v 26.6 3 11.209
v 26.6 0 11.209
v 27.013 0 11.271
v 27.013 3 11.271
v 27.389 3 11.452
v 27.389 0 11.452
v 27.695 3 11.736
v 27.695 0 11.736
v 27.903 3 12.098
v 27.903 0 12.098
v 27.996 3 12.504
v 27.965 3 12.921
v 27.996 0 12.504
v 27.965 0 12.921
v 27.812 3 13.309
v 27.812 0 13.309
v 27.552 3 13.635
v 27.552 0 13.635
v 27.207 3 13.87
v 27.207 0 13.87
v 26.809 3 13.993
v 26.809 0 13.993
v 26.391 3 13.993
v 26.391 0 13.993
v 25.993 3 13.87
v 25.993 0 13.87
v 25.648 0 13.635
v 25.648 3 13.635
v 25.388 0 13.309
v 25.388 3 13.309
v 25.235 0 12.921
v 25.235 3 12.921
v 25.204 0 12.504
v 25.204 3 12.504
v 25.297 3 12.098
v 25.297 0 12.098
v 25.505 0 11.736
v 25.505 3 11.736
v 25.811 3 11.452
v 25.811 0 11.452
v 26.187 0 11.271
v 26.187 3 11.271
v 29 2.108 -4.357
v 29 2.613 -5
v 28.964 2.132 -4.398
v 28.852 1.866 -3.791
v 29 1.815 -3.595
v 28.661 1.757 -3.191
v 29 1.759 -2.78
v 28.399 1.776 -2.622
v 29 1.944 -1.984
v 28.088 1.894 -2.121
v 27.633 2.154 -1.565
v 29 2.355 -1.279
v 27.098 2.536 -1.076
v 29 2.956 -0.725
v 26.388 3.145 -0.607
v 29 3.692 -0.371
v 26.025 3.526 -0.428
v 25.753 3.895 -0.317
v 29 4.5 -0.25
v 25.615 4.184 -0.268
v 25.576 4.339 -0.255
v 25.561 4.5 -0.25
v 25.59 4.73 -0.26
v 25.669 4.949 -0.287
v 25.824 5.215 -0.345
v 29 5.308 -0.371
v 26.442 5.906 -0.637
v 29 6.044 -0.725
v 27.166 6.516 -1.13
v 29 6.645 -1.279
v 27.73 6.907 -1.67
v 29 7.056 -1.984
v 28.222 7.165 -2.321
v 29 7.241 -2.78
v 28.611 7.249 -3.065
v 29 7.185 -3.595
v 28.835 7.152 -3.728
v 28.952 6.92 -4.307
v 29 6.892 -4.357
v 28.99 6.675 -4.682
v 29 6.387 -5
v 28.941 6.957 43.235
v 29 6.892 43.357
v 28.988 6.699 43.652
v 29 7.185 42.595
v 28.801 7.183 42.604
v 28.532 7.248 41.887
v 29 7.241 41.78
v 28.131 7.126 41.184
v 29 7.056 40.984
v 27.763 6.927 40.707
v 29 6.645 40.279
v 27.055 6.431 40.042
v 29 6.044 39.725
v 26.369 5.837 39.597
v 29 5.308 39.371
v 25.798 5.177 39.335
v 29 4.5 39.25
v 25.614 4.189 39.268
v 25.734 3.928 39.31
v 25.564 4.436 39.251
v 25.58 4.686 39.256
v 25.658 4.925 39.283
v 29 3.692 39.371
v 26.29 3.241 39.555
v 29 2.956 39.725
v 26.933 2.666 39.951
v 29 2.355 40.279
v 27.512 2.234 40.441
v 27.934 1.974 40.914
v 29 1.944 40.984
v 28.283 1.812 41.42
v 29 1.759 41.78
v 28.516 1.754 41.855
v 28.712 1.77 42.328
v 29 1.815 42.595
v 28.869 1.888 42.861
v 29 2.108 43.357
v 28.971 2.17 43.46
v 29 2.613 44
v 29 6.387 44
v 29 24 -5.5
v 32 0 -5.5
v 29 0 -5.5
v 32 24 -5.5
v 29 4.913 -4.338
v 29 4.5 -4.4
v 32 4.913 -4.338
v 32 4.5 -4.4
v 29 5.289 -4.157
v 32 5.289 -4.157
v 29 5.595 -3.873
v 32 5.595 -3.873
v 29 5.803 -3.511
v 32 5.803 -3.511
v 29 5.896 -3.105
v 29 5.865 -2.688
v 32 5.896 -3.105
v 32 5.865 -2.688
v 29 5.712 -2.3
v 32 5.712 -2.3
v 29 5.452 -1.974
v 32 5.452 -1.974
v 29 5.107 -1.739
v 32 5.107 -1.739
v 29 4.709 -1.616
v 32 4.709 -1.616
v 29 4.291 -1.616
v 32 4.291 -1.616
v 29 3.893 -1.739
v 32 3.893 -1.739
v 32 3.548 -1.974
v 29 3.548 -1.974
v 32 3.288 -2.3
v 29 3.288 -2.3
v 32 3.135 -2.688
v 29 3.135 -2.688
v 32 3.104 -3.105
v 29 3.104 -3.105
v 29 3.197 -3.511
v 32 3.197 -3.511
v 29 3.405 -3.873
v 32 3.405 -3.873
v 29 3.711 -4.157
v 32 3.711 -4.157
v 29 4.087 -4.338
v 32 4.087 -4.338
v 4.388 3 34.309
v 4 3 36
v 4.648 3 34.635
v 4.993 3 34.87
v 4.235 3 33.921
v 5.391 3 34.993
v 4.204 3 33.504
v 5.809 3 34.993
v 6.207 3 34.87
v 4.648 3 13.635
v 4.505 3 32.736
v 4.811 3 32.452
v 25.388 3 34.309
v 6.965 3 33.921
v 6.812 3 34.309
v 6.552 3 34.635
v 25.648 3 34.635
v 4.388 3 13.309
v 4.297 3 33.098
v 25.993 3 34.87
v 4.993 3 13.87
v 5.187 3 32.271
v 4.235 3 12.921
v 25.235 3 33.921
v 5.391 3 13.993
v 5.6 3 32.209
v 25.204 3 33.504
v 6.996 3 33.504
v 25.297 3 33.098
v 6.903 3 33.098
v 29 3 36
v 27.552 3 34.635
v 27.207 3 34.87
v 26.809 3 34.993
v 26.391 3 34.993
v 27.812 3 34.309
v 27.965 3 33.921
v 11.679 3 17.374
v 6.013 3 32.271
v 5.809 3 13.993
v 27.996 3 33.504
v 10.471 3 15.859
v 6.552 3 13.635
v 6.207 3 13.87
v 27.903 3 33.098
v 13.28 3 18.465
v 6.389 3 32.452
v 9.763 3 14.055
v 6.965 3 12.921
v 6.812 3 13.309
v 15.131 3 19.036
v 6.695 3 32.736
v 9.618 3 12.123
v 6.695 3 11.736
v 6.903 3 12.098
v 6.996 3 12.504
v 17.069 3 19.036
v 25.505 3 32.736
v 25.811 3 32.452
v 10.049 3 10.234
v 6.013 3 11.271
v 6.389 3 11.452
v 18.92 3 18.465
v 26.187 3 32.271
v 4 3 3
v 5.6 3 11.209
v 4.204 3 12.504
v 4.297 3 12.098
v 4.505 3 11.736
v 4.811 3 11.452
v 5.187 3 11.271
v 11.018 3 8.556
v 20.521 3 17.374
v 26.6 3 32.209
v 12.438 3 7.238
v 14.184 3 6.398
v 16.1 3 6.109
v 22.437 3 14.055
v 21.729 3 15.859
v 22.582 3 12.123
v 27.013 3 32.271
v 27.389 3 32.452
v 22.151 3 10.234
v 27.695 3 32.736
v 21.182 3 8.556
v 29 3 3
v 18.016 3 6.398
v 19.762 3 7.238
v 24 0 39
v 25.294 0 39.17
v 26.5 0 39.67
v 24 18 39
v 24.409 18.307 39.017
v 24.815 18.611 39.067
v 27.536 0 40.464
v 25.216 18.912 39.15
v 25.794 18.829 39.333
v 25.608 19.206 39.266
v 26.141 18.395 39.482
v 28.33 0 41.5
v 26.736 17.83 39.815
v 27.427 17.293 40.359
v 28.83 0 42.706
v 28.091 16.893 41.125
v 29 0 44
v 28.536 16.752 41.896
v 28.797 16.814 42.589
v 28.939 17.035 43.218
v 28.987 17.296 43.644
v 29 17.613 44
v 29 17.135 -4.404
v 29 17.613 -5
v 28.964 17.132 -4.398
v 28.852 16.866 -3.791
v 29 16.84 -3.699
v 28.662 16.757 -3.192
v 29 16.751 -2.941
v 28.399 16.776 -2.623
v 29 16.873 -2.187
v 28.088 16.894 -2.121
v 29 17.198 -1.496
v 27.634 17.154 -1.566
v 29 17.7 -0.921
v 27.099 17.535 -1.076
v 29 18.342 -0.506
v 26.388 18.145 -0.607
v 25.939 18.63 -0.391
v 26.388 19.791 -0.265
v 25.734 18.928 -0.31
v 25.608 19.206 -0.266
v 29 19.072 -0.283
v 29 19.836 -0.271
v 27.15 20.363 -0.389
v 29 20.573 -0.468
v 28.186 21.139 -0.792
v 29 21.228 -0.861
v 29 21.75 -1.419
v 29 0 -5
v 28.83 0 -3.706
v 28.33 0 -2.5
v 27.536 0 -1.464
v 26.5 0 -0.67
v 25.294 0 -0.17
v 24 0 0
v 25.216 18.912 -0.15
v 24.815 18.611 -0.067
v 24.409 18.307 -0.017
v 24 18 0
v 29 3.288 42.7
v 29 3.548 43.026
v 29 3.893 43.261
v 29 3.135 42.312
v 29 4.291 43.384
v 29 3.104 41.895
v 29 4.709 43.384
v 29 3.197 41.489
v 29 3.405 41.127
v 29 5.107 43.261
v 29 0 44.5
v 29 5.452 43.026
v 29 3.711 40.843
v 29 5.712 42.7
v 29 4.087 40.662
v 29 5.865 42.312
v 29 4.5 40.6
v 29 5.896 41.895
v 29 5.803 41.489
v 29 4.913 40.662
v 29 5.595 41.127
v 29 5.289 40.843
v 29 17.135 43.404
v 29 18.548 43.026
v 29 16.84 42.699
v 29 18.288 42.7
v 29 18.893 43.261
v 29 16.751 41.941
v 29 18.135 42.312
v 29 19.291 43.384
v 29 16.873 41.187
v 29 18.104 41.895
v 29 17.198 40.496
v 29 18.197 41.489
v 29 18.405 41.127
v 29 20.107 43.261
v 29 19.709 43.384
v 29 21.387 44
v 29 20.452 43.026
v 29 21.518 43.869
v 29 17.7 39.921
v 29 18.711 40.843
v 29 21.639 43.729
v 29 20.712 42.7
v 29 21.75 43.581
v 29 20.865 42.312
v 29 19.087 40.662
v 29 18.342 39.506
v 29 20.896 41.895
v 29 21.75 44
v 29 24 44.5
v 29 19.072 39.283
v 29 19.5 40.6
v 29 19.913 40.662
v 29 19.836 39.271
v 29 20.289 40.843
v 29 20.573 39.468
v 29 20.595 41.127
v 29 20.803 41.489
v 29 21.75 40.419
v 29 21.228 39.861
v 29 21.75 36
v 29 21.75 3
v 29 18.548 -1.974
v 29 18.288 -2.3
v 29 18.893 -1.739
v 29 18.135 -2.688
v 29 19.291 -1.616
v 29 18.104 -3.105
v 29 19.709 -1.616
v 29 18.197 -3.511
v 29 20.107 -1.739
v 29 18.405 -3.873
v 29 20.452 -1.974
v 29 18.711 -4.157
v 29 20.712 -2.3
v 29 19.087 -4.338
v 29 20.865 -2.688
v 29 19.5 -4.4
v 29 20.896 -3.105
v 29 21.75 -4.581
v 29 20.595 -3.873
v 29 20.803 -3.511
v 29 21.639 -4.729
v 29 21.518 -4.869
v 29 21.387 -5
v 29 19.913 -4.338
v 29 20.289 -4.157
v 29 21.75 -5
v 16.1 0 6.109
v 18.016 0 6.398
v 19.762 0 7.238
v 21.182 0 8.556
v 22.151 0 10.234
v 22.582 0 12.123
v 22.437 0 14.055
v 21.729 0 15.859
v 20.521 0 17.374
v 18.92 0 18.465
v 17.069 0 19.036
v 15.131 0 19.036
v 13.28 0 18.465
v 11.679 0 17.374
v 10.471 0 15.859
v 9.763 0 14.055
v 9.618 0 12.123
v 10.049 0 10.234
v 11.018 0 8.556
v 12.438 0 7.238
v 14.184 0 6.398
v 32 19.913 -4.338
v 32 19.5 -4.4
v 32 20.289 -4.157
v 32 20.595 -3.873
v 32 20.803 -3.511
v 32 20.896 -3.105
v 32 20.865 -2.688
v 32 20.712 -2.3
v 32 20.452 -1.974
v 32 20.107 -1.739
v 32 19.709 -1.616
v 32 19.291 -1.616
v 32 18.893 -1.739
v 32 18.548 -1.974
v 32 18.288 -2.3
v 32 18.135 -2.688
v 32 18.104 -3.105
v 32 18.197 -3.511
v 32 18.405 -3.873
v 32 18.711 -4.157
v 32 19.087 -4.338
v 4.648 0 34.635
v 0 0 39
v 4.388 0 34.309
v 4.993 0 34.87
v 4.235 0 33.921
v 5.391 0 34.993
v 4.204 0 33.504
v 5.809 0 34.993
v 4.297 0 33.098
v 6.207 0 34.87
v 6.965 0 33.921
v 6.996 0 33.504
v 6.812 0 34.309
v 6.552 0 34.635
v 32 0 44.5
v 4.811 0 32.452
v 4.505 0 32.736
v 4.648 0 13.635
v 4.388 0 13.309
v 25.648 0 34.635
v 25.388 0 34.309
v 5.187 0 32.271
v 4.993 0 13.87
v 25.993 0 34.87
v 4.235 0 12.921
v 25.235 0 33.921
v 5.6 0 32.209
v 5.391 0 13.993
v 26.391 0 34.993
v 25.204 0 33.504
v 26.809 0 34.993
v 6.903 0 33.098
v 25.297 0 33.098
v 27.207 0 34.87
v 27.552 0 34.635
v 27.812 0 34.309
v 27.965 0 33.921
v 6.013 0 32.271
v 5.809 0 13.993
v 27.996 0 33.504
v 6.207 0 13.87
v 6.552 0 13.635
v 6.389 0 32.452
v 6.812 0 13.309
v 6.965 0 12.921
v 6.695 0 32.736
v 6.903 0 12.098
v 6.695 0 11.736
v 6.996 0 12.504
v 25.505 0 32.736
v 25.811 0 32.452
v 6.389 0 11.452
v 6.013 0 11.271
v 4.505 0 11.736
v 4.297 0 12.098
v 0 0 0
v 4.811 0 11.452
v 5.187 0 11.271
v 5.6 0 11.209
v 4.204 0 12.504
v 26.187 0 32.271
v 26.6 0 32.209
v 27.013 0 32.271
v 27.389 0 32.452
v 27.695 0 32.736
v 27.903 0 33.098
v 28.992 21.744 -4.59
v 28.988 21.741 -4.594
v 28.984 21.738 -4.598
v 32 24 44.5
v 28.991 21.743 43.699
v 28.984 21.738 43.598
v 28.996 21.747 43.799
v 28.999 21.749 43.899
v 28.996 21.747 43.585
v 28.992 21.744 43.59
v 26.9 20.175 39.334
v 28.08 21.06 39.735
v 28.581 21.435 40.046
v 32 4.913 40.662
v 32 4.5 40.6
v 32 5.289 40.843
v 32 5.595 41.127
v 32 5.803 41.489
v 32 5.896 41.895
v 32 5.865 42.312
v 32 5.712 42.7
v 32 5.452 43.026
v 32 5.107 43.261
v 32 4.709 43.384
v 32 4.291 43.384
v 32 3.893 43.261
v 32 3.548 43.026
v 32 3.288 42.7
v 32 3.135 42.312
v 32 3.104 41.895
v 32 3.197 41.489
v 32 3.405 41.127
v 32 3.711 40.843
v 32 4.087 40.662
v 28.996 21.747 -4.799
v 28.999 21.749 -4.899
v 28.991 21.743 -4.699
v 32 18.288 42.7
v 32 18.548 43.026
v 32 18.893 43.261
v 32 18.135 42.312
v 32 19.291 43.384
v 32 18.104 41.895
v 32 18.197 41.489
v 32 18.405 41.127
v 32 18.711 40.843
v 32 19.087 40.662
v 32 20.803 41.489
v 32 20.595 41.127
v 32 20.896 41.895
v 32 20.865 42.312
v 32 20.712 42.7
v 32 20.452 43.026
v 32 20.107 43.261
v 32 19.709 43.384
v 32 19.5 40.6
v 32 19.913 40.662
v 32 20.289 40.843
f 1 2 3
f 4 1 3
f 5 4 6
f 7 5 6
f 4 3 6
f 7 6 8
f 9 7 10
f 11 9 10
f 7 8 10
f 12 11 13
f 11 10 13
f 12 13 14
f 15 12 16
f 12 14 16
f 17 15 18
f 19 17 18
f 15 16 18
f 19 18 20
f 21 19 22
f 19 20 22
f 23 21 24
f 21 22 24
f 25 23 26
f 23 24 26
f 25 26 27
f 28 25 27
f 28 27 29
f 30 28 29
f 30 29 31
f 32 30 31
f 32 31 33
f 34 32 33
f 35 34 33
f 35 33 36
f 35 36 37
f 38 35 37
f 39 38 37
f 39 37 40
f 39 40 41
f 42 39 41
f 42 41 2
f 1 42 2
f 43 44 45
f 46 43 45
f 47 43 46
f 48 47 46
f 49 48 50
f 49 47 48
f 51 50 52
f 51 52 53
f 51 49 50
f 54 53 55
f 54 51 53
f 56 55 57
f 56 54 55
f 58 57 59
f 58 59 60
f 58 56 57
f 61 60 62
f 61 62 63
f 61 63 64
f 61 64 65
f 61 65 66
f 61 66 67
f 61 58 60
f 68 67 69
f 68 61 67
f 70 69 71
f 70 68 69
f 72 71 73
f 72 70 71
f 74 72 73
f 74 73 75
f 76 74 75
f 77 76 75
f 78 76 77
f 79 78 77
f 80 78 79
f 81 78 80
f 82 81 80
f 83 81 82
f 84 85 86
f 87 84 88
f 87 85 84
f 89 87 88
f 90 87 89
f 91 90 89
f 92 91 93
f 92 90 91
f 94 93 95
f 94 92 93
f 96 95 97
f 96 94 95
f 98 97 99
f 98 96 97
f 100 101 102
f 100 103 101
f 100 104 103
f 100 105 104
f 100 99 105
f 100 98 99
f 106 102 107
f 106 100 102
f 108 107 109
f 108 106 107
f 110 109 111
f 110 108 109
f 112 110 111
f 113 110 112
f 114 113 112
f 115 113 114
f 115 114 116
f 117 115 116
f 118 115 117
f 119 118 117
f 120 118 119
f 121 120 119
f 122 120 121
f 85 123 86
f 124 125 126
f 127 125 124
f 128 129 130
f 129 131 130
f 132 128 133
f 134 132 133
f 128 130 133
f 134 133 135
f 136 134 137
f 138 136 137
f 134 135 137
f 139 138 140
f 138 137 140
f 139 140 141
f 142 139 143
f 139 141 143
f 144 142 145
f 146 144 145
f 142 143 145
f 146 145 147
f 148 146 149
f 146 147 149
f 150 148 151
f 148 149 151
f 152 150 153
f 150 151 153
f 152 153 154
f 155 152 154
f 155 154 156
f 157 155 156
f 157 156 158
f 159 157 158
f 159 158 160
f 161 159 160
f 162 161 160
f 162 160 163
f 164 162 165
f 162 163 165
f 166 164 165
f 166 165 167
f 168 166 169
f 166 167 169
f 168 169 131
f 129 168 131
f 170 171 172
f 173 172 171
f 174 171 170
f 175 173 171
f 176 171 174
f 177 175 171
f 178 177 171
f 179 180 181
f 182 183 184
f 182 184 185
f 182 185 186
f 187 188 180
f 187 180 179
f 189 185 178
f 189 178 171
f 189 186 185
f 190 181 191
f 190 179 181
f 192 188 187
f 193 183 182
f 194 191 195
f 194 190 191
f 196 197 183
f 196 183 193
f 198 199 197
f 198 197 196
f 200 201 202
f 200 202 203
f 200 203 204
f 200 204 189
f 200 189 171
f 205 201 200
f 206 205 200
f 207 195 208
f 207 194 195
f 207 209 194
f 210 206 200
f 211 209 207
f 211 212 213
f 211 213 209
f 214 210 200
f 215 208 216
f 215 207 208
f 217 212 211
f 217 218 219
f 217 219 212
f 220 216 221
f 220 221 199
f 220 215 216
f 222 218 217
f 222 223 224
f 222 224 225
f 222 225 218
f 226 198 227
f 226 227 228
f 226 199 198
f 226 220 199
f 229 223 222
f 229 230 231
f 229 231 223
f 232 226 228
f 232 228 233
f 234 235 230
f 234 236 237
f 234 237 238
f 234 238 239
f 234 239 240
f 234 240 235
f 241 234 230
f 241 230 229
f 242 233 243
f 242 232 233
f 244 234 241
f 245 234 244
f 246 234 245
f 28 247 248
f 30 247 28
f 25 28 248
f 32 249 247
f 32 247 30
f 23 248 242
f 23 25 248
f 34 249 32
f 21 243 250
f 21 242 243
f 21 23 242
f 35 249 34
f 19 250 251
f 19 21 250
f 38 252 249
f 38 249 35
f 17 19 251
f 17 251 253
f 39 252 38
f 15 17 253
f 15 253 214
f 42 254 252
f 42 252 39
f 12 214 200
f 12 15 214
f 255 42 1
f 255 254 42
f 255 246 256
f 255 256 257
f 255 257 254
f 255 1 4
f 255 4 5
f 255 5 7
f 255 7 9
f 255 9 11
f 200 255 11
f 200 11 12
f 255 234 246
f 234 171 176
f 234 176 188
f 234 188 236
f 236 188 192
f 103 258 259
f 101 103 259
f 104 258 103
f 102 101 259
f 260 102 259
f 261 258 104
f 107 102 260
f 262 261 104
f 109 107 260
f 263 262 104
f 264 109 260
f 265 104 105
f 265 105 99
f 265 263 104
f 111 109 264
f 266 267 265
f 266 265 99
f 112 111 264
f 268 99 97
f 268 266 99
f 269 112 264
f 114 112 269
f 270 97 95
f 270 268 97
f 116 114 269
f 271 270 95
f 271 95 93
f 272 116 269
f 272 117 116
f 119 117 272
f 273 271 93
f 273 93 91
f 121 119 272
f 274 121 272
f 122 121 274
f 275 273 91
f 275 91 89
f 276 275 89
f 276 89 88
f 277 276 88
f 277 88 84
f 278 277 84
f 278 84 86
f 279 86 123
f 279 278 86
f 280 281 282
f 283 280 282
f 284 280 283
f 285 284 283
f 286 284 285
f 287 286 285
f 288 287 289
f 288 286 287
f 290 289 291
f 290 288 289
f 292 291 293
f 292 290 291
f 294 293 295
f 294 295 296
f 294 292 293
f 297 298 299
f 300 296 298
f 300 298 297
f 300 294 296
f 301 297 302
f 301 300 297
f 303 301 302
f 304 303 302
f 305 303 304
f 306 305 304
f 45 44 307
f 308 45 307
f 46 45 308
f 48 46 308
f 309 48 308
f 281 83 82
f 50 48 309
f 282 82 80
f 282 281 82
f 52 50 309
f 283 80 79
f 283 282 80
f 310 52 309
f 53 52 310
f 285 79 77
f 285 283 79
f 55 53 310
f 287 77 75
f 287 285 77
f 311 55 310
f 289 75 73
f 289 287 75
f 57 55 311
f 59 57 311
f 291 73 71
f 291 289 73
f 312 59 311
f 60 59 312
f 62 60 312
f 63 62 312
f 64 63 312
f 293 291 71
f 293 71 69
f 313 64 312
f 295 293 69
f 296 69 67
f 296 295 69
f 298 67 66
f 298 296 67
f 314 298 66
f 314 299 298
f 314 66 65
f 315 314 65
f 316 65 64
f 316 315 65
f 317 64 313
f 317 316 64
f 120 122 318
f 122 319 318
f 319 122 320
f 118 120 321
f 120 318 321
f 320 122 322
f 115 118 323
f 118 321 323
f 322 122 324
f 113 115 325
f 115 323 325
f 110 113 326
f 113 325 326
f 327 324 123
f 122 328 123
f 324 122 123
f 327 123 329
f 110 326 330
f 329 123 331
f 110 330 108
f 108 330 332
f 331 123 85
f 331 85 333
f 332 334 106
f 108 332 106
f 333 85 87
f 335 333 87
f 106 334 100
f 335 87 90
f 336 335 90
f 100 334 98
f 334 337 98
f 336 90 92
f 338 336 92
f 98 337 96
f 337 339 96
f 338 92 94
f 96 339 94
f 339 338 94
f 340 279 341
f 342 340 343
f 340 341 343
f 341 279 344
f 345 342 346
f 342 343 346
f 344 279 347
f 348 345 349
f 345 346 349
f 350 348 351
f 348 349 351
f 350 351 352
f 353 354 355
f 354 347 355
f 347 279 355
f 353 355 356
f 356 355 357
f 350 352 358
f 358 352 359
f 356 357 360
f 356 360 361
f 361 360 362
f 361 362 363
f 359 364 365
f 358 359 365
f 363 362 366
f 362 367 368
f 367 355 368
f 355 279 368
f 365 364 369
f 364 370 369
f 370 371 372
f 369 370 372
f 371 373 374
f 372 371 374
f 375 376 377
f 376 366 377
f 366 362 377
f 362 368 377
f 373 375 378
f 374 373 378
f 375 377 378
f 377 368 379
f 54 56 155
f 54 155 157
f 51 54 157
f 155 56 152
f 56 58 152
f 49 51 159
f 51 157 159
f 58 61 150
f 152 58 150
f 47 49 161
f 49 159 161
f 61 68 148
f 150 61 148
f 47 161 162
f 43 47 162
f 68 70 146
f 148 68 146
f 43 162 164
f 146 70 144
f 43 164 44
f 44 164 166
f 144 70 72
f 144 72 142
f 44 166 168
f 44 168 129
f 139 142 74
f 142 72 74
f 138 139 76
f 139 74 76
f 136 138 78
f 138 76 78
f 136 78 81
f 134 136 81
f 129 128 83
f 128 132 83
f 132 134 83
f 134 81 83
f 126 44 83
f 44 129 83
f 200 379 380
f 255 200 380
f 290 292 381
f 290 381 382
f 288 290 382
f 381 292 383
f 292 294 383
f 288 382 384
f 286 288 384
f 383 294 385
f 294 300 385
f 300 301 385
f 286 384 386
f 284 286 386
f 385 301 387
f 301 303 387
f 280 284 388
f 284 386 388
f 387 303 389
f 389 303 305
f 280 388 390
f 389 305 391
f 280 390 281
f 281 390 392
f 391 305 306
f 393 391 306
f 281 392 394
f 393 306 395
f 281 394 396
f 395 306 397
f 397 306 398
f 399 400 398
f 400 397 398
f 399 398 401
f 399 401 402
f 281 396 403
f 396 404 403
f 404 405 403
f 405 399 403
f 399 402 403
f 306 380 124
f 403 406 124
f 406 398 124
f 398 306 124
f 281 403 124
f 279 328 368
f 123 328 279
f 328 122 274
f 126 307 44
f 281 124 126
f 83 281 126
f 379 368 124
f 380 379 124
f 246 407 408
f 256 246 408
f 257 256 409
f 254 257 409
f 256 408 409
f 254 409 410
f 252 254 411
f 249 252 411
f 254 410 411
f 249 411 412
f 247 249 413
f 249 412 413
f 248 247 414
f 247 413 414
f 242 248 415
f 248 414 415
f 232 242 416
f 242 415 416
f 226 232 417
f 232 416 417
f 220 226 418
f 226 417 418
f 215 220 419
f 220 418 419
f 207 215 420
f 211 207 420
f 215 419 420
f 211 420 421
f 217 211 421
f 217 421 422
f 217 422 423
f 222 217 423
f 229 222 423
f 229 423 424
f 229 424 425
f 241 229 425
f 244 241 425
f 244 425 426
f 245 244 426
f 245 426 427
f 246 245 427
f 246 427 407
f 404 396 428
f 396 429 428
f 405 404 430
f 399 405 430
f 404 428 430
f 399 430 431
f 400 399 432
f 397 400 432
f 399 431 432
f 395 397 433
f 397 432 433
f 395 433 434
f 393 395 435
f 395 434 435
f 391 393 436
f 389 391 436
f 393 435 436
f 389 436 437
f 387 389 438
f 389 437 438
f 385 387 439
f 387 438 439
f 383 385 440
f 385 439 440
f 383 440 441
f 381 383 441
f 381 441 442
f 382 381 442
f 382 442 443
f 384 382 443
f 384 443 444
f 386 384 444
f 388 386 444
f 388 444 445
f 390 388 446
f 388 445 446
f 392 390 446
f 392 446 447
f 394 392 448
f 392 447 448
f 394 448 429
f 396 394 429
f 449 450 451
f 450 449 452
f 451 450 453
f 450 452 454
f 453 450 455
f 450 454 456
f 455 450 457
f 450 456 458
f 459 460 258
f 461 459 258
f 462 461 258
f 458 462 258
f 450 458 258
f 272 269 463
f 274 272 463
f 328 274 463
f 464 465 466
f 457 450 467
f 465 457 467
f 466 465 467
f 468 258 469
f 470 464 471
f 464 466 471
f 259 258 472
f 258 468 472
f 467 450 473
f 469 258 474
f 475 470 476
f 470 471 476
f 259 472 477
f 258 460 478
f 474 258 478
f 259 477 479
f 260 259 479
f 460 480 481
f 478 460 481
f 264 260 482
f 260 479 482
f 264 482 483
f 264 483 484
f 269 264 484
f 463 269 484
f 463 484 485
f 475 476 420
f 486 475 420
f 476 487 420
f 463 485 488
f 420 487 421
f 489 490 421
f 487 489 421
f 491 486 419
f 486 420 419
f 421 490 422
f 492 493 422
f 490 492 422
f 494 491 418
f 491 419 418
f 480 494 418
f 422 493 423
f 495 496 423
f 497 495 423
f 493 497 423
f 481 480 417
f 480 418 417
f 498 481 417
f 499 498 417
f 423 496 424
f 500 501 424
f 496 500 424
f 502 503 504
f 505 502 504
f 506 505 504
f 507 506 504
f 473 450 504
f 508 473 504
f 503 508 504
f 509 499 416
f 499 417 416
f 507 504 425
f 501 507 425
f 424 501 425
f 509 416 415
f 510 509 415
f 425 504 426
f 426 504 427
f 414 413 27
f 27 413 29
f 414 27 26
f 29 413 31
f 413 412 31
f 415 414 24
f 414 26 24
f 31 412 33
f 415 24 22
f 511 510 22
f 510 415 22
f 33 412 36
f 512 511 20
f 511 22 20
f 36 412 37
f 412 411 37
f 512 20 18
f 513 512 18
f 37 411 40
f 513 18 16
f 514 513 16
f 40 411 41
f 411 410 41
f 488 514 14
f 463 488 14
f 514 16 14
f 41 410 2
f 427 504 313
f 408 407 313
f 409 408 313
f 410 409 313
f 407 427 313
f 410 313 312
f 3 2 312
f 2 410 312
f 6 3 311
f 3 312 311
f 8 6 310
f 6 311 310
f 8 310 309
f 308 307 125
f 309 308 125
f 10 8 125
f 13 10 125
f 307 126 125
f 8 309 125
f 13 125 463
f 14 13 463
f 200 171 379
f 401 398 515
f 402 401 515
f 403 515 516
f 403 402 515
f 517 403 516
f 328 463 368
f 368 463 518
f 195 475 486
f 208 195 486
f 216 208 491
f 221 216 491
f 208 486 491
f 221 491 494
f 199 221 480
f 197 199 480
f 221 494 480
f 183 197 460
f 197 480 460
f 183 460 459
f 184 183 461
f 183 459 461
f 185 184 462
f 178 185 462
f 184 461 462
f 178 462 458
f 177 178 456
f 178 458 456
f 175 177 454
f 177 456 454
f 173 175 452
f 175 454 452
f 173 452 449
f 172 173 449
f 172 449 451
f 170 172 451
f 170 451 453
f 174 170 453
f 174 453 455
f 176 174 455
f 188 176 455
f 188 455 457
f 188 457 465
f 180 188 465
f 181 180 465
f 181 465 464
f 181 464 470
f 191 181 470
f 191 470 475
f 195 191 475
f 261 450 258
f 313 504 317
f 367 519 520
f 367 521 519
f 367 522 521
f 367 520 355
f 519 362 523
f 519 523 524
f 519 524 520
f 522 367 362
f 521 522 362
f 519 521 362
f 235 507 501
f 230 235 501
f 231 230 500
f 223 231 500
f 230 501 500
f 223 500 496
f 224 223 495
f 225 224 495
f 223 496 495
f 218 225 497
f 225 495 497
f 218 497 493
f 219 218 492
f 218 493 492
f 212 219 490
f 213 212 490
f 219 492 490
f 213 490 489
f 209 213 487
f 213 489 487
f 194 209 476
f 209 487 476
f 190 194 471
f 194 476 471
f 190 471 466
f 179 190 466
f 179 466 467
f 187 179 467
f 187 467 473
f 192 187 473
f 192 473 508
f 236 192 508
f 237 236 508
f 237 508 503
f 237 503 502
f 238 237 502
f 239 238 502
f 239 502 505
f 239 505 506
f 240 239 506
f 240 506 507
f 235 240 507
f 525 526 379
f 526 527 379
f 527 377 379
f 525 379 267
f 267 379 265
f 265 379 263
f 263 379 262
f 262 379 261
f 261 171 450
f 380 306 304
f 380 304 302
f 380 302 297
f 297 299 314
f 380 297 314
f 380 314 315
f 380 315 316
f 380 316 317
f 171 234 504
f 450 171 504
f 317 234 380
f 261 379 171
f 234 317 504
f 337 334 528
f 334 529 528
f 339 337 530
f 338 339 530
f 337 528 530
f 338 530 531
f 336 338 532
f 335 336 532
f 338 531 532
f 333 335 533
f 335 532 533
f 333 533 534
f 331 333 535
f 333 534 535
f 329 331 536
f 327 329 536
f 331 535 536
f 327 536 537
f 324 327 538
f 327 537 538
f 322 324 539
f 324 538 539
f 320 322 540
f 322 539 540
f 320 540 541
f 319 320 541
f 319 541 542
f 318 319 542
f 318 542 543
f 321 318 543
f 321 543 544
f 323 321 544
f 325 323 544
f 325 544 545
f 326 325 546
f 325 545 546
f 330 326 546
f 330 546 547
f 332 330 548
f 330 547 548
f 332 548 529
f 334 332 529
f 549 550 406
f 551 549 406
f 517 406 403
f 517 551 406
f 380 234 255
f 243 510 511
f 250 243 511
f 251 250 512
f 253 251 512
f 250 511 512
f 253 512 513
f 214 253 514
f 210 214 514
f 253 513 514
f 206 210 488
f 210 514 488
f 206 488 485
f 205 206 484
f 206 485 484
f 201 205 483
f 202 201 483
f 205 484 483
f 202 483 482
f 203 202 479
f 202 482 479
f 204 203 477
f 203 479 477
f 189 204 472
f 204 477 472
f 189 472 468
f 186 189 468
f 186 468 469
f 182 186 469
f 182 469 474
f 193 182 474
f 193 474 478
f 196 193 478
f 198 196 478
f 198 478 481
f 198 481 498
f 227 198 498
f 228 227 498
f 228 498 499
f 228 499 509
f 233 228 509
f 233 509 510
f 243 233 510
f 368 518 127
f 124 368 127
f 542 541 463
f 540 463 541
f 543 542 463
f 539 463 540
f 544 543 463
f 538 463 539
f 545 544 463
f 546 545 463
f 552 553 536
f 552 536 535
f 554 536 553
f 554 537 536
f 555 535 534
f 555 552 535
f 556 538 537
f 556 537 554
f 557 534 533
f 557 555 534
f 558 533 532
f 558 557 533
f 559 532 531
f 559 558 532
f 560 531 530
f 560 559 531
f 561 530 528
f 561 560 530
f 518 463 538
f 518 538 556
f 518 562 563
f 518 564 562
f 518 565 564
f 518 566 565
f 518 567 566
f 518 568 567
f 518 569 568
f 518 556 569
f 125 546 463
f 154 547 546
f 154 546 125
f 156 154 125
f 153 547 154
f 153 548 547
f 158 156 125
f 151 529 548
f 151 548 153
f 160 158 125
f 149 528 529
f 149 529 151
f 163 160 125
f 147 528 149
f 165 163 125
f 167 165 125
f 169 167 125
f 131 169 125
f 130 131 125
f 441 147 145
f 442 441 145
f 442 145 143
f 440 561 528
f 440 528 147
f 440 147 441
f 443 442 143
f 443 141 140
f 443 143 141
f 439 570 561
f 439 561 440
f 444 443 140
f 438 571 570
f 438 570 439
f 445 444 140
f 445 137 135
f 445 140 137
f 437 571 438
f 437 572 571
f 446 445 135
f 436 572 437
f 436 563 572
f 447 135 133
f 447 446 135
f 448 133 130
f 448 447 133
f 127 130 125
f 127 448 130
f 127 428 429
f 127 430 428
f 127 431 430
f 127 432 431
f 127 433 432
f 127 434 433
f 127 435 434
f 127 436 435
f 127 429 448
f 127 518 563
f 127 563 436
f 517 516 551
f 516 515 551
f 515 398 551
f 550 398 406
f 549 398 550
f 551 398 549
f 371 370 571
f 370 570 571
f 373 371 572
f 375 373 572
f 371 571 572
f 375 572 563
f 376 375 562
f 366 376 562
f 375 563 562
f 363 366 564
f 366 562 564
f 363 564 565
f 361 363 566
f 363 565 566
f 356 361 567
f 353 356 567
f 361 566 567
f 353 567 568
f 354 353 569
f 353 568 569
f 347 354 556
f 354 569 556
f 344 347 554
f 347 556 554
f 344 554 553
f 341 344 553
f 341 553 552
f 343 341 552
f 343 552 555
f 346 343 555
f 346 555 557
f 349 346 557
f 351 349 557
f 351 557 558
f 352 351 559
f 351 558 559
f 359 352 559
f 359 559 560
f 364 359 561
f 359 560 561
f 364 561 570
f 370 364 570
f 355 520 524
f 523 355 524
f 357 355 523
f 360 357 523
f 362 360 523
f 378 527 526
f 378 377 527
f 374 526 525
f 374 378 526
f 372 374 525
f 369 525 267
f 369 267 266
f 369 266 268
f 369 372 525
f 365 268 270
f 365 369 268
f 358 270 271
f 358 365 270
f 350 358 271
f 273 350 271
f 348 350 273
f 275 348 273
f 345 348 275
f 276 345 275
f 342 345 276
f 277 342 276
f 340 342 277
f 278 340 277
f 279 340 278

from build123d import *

# Parameters (mm, degrees)
EXTRUDE_1_DEPTH           = 39
SHELL_1_T                 = -3
SKETCH_2_R                = 1.4
CUT_EXTRUDE_1_DEPTH       = 30
SKETCH_3_R                = 6.5
CUT_EXTRUDE_2_DEPTH       = 5
SKETCH_5_W                = 50
SKETCH_5_H                = 24
EXTRUDE_2_DEPTH           = 3
SKETCH_4_R                = 1.4
CUT_EXTRUDE_3_DEPTH       = 5
FILLET_1_R                = 5
CUT_EXTRUDE_4_OUTLINE_R   = 1.4
CUT_EXTRUDE_4_OUTLINE_R_2 = 2.75
CUT_EXTRUDE_4_DEPTH       = 3.43874985


with BuildPart() as part:
    # ｽｹｯﾁ1 → ﾎﾞｽ - 押し出し1 (new body)
    with BuildSketch(Plane.XY):
        Polygon((0, 0), (32, 0), (32, 24), align=None)
    extrude(amount=EXTRUDE_1_DEPTH)

    # ｼｪﾙ1
    shell_1_openings = [part.faces().sort_by_distance(p)[0] for p in [
        (16, 12, 19.5),
    ]]
    offset(amount=SHELL_1_T, openings=shell_1_openings, kind=Kind.INTERSECTION)

    # ｽｹｯﾁ2 → ｶｯﾄ - 押し出し1 (cut)
    with BuildSketch(Plane.XZ):
        with Locations(Location((26.6, 12.609, 0), (0, 0, 270))):
            Circle(SKETCH_2_R)
        with Locations(Location((5.6, 12.609, 0), (0, 0, 270))):
            Circle(SKETCH_2_R)
        with Locations(Location((5.6, 33.609, 0), (0, 0, 270))):
            Circle(SKETCH_2_R)
        with Locations(Location((26.6, 33.609, 0), (0, 0, 270))):
            Circle(SKETCH_2_R)
    extrude(amount=-CUT_EXTRUDE_1_DEPTH, mode=Mode.SUBTRACT)

    # ｽｹｯﾁ3 → ｶｯﾄ - 押し出し2 (cut)
    with BuildSketch(Plane.XZ):
        with Locations(Location((16.1, 12.609, 0), (0, 0, 270))):
            Circle(SKETCH_3_R)
    extrude(amount=-CUT_EXTRUDE_2_DEPTH, mode=Mode.SUBTRACT)

    # ｽｹｯﾁ5 → ﾎﾞｽ - 押し出し2 (add)
    with BuildSketch(Plane(origin=(32, 0, 0), x_dir=(0, 0, -1), z_dir=(1, 0, 0))):
        with Locations((-19.5, 12)):
            Rectangle(SKETCH_5_W, SKETCH_5_H)
    extrude(amount=-EXTRUDE_2_DEPTH)

    # ｽｹｯﾁ4 → ｶｯﾄ - 押し出し3 (cut)
    with BuildSketch(Plane(origin=(32, 0, 0), x_dir=(0, 0, -1), z_dir=(1, 0, 0))):
        with Locations((3, 19.5)):
            Circle(SKETCH_4_R)
        with Locations((-42, 19.5)):
            Circle(SKETCH_4_R)
        with Locations((-42, 4.5)):
            Circle(SKETCH_4_R)
        with Locations((3, 4.5)):
            Circle(SKETCH_4_R)
    extrude(amount=-CUT_EXTRUDE_3_DEPTH, mode=Mode.SUBTRACT)

    # ﾌｨﾚｯﾄ1
    # the kernel refuses this fillet: 5 mm, written as the material it adds along each edge
    with BuildSketch(Plane(origin=(29, 34.25, 39), x_dir=(-1, 0, 0), z_dir=(0, -1, 0))) as fillet_1_piece_1_section:
        with BuildLine():
            CenterArc((FILLET_1_R, -FILLET_1_R), FILLET_1_R, 90, 90)
            Line((0, -FILLET_1_R), (0, 0))
            Line((0, 0), (FILLET_1_R, 0))
        make_face()
    fillet_1_piece_1 = extrude(amount=34.25, mode=Mode.PRIVATE)
    fillet_1_piece_1 = split(fillet_1_piece_1, bisect_by=Plane(origin=(35, 26.25, 39), z_dir=(0.6, -0.8, 0)), keep=Keep.TOP, mode=Mode.PRIVATE)
    fillet_1_piece_1 = fillet_1_piece_1 - Plane(origin=(29, 4.5, 42), x_dir=(0, 0, -1), z_dir=(1, 0, 0)) * Cylinder(1.4, 89, mode=Mode.PRIVATE)
    fillet_1_piece_1 = fillet_1_piece_1 - Plane(origin=(29, 19.5, 42), x_dir=(0, 0, -1), z_dir=(1, 0, 0)) * Cylinder(1.4, 89, mode=Mode.PRIVATE)
    add(fillet_1_piece_1)
    with BuildSketch(Plane(origin=(29, 34.25, 0), x_dir=(-1, 0, 0), z_dir=(0, -1, 0))) as fillet_1_piece_2_section:
        with BuildLine():
            CenterArc((FILLET_1_R, FILLET_1_R), FILLET_1_R, 180, 90)
            Line((0, FILLET_1_R), (0, 0))
            Line((0, 0), (FILLET_1_R, 0))
        make_face()
    fillet_1_piece_2 = extrude(amount=34.25, mode=Mode.PRIVATE)
    fillet_1_piece_2 = split(fillet_1_piece_2, bisect_by=Plane(origin=(35, 26.25, 0), z_dir=(0.6, -0.8, 0)), keep=Keep.TOP, mode=Mode.PRIVATE)
    fillet_1_piece_2 = fillet_1_piece_2 - Plane(origin=(29, 4.5, -3), x_dir=(0, 0, -1), z_dir=(1, 0, 0)) * Cylinder(1.4, 89, mode=Mode.PRIVATE)
    fillet_1_piece_2 = fillet_1_piece_2 - Plane(origin=(29, 19.5, -3), x_dir=(0, 0, -1), z_dir=(1, 0, 0)) * Cylinder(1.4, 89, mode=Mode.PRIVATE)
    add(fillet_1_piece_2)

    # ｶｯﾄ - 押し出し4: read off the stored shape, not the designer's step
    # ｶｯﾄ - 押し出し4 outline → ｶｯﾄ - 押し出し4 (cut)
    # profile 1 of 4: a face of its own
    with BuildSketch(Plane.ZY.offset(-29)):
        with BuildLine():
            ThreePointArc((44, 17.612541391), (44.75, 19.5), (44, 21.387458609))
            ThreePointArc((44, 21.387458609), (43.799721616, 21.579303274), (43.58113883, 21.75))
            ThreePointArc((43.58113883, 21.75), (42, 22.25), (40.41886117, 21.75))
            ThreePointArc((40.41886117, 21.75), (39.920696726, 17.700278384), (44, 17.612541391))
        make_face()
        with Locations((42, 19.5)):
            Circle(CUT_EXTRUDE_4_OUTLINE_R, mode=Mode.SUBTRACT)
    # profile 2 of 4: a face of its own
    with BuildSketch(Plane.ZY.offset(-29)):
        with BuildLine():
            ThreePointArc((44, 2.612541391), (44.75, 4.5), (44, 6.387458609))
            ThreePointArc((44, 6.387458609), (39.25, 4.5), (44, 2.612541391))
        make_face()
        with Locations((42, 4.5)):
            Circle(CUT_EXTRUDE_4_OUTLINE_R, mode=Mode.SUBTRACT)
    # profile 3 of 4: a face of its own
    with BuildSketch(Plane.ZY.offset(-29)):
        with BuildLine():
            ThreePointArc((-5, 21.387458609), (-1.200278384, 17.420696726), (-4.58113883, 21.75))
            ThreePointArc((-4.58113883, 21.75), (-4.799721616, 21.579303274), (-5, 21.387458609))
        make_face()
        with Locations((-3, 19.5)):
            Circle(CUT_EXTRUDE_4_OUTLINE_R, mode=Mode.SUBTRACT)
    # profile 4 of 4: a face of its own
    with BuildSketch(Plane.ZY.offset(-29)):
        with Locations((-3, 4.5)):
            Circle(CUT_EXTRUDE_4_OUTLINE_R_2)
        with Locations((-3, 4.5)):
            Circle(CUT_EXTRUDE_4_OUTLINE_R, mode=Mode.SUBTRACT)
    extrude(amount=CUT_EXTRUDE_4_DEPTH, mode=Mode.SUBTRACT)


solid = part.part
